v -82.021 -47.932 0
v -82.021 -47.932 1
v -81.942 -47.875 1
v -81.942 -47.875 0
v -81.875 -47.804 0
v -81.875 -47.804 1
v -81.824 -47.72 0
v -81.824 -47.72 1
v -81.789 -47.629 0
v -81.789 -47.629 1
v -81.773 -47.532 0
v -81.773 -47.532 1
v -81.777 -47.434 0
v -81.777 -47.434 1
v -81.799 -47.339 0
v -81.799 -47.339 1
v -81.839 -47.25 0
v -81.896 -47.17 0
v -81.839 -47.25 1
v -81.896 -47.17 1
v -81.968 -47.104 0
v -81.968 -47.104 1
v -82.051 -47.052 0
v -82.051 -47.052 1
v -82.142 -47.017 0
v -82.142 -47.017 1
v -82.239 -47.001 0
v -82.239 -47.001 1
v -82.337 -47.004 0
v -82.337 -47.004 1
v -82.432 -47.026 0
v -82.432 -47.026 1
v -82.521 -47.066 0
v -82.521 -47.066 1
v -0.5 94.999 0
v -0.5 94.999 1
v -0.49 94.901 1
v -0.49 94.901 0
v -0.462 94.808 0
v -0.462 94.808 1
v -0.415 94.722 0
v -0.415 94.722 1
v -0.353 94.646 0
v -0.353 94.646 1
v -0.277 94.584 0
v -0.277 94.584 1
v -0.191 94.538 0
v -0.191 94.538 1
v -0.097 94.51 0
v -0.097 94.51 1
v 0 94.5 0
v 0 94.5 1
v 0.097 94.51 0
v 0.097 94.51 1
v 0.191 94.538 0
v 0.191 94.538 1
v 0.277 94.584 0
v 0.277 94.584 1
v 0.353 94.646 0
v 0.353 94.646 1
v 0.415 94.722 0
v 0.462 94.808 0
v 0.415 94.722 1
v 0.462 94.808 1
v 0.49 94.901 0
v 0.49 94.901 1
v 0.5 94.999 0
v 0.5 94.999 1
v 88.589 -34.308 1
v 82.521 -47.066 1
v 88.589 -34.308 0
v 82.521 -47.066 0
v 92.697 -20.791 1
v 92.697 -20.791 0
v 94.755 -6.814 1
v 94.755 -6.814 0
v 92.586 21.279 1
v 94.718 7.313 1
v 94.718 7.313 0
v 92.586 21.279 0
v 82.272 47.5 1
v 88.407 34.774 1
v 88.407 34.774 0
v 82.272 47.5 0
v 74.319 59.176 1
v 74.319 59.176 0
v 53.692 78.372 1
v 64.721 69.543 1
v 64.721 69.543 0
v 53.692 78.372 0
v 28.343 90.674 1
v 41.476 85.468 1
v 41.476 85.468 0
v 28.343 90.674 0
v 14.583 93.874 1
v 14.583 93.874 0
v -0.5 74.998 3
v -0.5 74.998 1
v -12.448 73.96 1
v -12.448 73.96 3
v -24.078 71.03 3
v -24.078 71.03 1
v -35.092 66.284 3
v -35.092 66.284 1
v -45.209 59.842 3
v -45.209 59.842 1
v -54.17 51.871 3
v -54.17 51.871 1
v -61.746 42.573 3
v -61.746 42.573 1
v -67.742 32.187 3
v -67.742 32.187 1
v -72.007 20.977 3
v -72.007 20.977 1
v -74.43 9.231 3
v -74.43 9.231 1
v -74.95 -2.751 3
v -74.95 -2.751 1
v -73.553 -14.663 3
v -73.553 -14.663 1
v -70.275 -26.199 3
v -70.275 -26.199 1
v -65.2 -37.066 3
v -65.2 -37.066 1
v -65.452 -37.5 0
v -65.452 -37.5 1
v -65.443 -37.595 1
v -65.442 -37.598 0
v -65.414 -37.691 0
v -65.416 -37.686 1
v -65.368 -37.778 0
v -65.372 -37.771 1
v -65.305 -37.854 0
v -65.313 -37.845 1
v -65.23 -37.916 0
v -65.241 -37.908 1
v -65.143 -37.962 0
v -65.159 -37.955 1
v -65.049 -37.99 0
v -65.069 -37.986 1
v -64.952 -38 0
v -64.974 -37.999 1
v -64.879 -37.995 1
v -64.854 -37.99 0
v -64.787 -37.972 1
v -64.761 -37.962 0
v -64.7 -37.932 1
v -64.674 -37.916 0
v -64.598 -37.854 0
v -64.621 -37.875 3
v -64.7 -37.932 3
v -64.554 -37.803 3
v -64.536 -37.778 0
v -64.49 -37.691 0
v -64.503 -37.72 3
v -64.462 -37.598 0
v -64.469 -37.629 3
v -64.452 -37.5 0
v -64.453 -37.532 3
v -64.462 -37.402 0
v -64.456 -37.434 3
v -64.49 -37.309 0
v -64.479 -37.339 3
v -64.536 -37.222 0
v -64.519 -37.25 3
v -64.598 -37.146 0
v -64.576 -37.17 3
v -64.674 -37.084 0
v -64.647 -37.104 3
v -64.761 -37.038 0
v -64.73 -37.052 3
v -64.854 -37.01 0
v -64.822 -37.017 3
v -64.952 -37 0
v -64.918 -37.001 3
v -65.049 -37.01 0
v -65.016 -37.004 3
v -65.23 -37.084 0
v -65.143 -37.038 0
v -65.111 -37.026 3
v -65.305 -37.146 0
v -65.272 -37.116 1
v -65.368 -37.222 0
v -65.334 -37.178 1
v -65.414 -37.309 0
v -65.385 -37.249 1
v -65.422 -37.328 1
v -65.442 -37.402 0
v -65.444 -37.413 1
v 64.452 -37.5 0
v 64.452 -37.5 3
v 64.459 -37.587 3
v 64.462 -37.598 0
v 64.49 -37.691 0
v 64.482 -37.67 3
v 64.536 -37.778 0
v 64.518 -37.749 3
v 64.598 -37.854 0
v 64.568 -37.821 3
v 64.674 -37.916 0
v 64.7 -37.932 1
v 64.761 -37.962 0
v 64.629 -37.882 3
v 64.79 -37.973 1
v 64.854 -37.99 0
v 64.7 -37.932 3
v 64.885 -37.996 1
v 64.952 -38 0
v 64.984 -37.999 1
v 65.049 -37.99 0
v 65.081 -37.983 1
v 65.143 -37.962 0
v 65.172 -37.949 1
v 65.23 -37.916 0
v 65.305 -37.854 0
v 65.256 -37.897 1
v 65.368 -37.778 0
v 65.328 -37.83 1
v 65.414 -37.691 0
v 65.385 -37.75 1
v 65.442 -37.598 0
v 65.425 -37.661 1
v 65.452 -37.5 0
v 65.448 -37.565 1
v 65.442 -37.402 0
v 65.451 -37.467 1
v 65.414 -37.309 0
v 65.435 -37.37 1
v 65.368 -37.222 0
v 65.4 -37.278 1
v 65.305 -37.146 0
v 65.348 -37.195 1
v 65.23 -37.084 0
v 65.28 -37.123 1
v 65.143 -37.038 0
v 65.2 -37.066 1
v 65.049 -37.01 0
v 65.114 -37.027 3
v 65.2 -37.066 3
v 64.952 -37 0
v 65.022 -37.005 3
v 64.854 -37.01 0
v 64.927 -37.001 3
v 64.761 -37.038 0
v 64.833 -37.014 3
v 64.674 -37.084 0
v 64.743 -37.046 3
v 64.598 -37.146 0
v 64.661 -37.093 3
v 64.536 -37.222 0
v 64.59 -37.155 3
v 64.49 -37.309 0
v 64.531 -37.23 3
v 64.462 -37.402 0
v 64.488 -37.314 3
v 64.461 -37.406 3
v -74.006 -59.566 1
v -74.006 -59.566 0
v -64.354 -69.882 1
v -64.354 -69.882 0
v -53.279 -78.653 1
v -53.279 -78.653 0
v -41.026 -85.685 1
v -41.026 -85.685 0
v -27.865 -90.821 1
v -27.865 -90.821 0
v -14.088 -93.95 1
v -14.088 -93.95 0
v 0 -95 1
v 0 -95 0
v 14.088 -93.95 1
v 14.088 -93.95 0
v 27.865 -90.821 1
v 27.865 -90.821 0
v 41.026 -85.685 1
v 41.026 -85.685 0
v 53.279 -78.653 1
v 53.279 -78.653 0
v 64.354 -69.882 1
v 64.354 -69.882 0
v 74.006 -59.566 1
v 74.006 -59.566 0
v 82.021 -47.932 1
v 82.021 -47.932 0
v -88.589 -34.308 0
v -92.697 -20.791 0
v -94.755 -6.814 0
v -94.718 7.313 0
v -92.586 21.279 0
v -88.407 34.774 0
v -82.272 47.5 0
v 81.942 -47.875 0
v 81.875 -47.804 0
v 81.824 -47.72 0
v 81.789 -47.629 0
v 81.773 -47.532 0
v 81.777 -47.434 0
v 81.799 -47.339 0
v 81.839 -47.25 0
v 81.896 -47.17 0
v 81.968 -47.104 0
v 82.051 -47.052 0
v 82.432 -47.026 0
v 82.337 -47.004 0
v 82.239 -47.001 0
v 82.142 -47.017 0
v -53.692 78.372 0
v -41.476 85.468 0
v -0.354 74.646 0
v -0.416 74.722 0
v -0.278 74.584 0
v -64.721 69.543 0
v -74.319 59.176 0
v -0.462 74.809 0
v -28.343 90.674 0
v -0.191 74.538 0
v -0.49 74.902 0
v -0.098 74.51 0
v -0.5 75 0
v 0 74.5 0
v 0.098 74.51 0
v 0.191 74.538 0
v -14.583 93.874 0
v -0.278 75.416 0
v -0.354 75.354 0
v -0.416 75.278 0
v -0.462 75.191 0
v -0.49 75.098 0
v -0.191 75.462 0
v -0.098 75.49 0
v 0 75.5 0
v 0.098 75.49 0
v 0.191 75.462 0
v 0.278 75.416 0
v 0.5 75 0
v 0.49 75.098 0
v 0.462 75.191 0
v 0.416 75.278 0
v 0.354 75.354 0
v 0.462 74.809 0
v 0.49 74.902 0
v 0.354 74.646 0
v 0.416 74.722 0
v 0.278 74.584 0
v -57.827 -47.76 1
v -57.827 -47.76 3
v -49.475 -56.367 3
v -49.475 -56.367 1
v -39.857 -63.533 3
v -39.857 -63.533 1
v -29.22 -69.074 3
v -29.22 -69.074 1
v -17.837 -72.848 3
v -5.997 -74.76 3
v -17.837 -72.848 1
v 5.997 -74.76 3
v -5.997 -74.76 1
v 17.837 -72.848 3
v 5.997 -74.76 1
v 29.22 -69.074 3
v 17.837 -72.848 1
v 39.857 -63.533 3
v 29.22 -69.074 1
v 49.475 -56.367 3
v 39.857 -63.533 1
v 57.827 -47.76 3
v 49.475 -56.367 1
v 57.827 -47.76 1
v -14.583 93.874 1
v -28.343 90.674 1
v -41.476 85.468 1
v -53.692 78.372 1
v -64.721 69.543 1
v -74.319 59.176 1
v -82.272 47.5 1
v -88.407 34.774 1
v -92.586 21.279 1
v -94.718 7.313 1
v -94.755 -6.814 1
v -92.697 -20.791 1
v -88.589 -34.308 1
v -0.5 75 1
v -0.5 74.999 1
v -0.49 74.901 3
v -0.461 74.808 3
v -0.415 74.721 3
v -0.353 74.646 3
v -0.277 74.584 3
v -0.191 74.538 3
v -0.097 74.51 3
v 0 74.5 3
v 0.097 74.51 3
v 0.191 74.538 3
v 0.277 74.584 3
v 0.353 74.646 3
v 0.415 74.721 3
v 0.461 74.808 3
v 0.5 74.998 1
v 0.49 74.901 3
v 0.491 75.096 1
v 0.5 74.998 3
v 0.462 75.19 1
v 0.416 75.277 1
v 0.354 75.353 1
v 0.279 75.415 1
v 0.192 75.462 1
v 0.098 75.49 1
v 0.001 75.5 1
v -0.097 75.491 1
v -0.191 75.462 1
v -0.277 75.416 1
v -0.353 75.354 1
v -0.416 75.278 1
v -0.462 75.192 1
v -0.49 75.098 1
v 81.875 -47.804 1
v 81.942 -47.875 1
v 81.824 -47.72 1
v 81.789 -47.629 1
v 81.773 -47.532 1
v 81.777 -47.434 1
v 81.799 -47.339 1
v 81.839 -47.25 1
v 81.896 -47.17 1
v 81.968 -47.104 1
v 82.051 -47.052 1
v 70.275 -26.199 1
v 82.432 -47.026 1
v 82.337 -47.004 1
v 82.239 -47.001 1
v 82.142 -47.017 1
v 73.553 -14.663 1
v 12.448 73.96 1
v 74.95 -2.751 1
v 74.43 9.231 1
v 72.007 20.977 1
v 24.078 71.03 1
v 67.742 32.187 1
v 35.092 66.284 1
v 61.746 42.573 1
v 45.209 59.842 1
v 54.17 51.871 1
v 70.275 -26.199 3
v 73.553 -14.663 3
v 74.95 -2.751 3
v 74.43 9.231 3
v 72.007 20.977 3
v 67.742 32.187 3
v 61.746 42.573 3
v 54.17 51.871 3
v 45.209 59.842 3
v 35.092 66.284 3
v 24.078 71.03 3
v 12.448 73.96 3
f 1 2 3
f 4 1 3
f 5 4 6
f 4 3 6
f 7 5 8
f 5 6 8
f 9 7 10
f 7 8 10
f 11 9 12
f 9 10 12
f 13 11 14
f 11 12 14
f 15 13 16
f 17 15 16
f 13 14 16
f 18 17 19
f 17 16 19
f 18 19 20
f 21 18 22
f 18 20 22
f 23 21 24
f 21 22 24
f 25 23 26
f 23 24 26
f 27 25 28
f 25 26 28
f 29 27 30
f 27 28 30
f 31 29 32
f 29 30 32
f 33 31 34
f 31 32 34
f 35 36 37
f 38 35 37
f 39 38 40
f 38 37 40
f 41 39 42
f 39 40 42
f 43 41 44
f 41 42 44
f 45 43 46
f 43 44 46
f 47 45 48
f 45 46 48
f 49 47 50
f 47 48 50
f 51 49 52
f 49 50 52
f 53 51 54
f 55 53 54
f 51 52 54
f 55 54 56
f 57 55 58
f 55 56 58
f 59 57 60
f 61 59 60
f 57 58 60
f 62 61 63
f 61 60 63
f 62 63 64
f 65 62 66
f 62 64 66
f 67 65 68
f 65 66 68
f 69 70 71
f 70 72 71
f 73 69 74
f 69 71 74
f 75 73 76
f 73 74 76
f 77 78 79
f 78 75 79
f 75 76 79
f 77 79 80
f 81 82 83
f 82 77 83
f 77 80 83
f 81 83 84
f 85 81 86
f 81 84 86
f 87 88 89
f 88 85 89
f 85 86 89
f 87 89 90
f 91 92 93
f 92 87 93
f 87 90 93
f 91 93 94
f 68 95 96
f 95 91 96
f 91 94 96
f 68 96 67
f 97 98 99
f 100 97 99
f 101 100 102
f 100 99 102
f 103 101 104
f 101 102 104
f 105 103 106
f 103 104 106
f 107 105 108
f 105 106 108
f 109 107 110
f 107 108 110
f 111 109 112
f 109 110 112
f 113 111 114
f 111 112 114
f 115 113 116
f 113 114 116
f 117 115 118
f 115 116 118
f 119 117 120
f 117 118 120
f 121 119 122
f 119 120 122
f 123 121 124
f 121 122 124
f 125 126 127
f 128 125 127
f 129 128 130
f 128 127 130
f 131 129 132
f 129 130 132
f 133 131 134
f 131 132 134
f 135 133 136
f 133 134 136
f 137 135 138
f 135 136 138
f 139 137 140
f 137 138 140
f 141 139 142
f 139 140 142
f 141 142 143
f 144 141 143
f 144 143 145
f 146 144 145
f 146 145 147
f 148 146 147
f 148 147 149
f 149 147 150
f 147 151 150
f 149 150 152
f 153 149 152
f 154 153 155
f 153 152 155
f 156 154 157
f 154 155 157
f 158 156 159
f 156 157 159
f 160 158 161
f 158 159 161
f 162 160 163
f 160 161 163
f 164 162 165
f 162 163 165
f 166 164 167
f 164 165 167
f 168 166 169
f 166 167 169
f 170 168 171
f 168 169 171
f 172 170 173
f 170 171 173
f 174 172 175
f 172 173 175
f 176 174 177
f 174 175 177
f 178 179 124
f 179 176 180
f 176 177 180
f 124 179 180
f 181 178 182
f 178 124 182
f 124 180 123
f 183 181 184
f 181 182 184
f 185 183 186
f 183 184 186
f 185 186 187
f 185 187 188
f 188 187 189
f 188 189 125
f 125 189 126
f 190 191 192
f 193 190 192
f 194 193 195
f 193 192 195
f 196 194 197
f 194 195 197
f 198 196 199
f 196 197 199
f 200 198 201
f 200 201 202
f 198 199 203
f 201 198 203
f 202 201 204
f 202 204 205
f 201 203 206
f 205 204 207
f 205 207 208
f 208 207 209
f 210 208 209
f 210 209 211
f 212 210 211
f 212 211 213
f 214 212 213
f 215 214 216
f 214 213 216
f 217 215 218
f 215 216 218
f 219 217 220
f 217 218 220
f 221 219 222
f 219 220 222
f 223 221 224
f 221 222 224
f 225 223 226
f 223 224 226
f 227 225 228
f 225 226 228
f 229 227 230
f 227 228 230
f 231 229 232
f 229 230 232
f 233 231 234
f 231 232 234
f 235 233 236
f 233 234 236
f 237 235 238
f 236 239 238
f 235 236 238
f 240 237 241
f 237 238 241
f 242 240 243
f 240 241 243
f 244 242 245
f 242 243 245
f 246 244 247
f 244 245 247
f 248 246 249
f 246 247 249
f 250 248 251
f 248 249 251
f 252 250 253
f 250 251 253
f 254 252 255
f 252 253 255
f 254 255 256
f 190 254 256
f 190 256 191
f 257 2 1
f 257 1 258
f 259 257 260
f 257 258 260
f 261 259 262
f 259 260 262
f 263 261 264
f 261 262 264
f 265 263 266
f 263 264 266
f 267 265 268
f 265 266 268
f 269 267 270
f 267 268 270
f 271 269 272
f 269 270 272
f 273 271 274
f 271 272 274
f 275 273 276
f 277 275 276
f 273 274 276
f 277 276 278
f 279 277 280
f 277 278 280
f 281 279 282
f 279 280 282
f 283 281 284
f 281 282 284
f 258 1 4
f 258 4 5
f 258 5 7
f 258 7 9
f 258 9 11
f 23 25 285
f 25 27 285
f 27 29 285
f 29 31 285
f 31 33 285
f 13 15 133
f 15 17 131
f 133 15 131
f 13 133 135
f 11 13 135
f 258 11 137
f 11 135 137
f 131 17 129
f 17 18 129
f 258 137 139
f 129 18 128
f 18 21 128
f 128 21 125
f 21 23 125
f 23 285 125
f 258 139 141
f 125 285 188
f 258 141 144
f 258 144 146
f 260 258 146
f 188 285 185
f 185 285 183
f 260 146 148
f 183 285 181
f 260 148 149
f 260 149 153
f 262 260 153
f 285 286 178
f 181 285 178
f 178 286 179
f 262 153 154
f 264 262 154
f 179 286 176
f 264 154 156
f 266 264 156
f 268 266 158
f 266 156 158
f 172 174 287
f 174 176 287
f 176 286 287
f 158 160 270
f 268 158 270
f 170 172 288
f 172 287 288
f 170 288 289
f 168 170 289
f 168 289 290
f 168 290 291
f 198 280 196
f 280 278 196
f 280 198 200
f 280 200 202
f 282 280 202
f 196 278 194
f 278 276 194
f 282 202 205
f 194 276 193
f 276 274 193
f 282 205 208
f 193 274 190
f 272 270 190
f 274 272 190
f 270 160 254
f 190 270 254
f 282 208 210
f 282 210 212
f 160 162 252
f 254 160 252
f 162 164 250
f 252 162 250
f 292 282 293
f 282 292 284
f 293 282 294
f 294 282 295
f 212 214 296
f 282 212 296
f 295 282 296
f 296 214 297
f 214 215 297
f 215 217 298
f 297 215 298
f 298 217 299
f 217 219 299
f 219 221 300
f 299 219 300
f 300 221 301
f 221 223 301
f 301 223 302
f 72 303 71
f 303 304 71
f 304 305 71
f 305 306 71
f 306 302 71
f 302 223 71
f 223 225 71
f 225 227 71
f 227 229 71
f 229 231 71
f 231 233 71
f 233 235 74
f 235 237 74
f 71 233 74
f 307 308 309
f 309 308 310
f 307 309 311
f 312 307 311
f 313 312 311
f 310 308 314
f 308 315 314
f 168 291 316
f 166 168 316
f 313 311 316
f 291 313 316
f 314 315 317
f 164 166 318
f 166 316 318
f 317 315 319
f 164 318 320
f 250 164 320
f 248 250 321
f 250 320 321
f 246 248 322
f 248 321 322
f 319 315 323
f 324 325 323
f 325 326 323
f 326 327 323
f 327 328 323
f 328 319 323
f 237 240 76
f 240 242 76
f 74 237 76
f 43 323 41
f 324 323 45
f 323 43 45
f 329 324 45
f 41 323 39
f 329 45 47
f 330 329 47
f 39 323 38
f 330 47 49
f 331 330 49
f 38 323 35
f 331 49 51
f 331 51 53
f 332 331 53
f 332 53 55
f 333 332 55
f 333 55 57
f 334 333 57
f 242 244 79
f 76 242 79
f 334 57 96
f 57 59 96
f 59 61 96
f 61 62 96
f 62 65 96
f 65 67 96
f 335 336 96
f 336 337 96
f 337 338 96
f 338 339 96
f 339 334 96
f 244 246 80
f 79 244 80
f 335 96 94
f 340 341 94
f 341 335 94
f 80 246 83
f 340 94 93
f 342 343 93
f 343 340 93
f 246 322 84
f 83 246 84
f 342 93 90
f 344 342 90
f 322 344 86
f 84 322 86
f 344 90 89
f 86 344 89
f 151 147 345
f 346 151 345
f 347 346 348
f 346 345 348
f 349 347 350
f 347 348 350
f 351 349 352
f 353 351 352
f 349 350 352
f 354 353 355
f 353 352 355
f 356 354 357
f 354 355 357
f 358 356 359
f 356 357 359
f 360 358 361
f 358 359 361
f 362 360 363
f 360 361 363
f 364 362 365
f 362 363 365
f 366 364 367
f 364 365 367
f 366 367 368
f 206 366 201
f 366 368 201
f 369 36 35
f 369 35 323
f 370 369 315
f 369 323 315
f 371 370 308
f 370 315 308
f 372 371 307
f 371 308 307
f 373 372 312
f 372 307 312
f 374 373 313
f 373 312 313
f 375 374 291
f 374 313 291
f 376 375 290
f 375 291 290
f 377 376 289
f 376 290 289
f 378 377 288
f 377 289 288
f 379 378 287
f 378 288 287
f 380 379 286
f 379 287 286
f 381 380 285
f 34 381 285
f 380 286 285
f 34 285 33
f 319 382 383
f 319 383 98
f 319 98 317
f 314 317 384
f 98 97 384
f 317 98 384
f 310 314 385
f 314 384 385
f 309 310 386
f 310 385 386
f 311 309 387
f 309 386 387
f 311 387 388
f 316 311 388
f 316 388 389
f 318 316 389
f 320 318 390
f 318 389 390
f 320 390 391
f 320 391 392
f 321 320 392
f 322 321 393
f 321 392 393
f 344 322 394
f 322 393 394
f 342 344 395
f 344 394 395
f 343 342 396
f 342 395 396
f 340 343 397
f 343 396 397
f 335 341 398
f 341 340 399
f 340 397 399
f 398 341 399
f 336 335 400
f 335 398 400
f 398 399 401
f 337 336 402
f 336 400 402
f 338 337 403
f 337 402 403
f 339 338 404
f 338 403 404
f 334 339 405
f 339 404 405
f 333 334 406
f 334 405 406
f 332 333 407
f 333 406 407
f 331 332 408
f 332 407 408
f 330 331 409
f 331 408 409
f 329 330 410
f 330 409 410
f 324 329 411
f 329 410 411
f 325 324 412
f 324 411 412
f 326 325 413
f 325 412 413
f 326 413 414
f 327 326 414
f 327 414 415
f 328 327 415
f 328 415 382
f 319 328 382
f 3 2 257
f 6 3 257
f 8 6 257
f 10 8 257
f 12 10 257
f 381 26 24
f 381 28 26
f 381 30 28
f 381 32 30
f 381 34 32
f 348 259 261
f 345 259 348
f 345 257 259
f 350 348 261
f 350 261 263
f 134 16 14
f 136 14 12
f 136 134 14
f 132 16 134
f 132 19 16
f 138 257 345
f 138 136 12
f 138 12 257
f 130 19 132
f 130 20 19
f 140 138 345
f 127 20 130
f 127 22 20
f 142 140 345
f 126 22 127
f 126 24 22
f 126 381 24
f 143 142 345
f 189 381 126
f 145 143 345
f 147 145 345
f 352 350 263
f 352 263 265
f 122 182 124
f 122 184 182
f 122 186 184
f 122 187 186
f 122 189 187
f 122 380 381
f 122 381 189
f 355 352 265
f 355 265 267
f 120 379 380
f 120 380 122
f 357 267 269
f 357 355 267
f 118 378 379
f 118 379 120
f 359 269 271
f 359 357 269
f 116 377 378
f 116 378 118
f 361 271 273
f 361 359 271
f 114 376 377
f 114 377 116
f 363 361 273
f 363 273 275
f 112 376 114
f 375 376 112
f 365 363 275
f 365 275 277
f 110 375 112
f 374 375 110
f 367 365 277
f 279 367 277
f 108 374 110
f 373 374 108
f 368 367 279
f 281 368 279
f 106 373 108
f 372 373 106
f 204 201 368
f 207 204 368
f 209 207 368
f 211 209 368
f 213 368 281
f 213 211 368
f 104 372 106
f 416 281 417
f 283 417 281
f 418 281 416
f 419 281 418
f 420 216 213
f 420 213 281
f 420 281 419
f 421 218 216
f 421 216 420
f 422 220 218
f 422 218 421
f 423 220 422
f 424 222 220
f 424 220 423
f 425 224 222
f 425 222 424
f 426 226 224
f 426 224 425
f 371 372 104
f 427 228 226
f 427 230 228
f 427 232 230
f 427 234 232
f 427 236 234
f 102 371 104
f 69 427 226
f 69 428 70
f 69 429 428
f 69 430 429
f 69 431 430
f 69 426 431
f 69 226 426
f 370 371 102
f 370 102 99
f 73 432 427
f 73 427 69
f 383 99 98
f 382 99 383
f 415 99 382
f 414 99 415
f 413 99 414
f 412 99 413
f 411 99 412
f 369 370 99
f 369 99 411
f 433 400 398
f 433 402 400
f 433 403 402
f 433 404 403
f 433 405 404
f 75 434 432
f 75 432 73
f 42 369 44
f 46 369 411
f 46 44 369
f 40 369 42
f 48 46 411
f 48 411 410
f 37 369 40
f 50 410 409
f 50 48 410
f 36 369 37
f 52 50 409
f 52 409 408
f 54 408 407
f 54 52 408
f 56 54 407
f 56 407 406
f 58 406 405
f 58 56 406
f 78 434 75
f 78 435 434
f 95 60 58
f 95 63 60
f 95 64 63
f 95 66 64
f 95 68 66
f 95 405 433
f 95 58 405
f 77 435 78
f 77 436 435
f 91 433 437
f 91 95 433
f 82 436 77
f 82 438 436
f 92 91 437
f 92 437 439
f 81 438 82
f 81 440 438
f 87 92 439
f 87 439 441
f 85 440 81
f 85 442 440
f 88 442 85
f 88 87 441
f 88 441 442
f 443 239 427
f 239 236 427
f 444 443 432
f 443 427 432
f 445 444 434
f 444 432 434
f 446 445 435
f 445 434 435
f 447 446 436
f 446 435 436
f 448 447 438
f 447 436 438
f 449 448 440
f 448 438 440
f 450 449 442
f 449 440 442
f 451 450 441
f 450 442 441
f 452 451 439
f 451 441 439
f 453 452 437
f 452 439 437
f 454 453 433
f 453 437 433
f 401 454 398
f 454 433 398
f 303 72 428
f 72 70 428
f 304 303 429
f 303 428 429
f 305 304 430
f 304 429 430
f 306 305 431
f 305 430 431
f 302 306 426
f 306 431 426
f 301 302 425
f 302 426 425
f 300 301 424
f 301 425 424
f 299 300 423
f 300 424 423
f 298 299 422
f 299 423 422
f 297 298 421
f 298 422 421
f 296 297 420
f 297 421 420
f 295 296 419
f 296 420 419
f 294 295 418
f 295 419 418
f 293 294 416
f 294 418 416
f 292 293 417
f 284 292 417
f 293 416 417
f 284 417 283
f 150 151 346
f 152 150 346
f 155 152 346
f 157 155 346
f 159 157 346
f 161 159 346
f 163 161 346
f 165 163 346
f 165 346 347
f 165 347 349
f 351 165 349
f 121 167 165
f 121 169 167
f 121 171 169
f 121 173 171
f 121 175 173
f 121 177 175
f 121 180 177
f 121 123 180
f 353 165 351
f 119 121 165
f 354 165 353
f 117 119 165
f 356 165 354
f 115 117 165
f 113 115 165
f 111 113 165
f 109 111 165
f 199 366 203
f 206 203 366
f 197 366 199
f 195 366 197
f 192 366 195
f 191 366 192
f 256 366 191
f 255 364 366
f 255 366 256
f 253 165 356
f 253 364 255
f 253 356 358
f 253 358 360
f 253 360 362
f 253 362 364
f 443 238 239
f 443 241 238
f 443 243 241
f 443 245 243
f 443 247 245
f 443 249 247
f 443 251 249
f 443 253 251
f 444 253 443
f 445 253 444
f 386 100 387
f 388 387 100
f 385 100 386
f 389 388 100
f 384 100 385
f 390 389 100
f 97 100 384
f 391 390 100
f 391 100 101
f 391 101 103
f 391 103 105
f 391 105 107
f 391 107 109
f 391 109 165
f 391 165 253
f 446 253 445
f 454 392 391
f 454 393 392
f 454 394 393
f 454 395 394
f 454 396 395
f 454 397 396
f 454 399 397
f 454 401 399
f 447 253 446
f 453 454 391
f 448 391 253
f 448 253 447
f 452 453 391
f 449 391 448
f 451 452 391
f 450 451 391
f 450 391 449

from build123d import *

# Parameters (mm, degrees)
F0_R     = 95
F0_R_2   = 75
F1_DEPTH = 1
F2_DEPTH = 3
F3_D     = 1


with BuildPart() as f1:
    # F0 (on Top) → F1 (new body)
    with BuildSketch(Plane.XY):
        Circle(F0_R)
        Circle(F0_R_2, mode=Mode.SUBTRACT)
        Circle(F0_R_2)
    extrude(amount=F1_DEPTH)

    # F0 (on Top) → F2 (join)
    with BuildSketch(Plane.XY):
        Circle(F0_R_2)
    extrude(amount=F2_DEPTH)

    # F3 (through all)
    with Locations(Plane(origin=(0, 0, 0), x_dir=(1, 0, 0), z_dir=(0, 0, -1))):
        with Locations((0, -75), (-64.9519052838, 37.5), (64.9519052838, 37.5), (82.2724133595, 47.5), (-82.2724133595, 47.5), (0, -95)):
            Hole(F3_D / 2)


solid = f1.part
